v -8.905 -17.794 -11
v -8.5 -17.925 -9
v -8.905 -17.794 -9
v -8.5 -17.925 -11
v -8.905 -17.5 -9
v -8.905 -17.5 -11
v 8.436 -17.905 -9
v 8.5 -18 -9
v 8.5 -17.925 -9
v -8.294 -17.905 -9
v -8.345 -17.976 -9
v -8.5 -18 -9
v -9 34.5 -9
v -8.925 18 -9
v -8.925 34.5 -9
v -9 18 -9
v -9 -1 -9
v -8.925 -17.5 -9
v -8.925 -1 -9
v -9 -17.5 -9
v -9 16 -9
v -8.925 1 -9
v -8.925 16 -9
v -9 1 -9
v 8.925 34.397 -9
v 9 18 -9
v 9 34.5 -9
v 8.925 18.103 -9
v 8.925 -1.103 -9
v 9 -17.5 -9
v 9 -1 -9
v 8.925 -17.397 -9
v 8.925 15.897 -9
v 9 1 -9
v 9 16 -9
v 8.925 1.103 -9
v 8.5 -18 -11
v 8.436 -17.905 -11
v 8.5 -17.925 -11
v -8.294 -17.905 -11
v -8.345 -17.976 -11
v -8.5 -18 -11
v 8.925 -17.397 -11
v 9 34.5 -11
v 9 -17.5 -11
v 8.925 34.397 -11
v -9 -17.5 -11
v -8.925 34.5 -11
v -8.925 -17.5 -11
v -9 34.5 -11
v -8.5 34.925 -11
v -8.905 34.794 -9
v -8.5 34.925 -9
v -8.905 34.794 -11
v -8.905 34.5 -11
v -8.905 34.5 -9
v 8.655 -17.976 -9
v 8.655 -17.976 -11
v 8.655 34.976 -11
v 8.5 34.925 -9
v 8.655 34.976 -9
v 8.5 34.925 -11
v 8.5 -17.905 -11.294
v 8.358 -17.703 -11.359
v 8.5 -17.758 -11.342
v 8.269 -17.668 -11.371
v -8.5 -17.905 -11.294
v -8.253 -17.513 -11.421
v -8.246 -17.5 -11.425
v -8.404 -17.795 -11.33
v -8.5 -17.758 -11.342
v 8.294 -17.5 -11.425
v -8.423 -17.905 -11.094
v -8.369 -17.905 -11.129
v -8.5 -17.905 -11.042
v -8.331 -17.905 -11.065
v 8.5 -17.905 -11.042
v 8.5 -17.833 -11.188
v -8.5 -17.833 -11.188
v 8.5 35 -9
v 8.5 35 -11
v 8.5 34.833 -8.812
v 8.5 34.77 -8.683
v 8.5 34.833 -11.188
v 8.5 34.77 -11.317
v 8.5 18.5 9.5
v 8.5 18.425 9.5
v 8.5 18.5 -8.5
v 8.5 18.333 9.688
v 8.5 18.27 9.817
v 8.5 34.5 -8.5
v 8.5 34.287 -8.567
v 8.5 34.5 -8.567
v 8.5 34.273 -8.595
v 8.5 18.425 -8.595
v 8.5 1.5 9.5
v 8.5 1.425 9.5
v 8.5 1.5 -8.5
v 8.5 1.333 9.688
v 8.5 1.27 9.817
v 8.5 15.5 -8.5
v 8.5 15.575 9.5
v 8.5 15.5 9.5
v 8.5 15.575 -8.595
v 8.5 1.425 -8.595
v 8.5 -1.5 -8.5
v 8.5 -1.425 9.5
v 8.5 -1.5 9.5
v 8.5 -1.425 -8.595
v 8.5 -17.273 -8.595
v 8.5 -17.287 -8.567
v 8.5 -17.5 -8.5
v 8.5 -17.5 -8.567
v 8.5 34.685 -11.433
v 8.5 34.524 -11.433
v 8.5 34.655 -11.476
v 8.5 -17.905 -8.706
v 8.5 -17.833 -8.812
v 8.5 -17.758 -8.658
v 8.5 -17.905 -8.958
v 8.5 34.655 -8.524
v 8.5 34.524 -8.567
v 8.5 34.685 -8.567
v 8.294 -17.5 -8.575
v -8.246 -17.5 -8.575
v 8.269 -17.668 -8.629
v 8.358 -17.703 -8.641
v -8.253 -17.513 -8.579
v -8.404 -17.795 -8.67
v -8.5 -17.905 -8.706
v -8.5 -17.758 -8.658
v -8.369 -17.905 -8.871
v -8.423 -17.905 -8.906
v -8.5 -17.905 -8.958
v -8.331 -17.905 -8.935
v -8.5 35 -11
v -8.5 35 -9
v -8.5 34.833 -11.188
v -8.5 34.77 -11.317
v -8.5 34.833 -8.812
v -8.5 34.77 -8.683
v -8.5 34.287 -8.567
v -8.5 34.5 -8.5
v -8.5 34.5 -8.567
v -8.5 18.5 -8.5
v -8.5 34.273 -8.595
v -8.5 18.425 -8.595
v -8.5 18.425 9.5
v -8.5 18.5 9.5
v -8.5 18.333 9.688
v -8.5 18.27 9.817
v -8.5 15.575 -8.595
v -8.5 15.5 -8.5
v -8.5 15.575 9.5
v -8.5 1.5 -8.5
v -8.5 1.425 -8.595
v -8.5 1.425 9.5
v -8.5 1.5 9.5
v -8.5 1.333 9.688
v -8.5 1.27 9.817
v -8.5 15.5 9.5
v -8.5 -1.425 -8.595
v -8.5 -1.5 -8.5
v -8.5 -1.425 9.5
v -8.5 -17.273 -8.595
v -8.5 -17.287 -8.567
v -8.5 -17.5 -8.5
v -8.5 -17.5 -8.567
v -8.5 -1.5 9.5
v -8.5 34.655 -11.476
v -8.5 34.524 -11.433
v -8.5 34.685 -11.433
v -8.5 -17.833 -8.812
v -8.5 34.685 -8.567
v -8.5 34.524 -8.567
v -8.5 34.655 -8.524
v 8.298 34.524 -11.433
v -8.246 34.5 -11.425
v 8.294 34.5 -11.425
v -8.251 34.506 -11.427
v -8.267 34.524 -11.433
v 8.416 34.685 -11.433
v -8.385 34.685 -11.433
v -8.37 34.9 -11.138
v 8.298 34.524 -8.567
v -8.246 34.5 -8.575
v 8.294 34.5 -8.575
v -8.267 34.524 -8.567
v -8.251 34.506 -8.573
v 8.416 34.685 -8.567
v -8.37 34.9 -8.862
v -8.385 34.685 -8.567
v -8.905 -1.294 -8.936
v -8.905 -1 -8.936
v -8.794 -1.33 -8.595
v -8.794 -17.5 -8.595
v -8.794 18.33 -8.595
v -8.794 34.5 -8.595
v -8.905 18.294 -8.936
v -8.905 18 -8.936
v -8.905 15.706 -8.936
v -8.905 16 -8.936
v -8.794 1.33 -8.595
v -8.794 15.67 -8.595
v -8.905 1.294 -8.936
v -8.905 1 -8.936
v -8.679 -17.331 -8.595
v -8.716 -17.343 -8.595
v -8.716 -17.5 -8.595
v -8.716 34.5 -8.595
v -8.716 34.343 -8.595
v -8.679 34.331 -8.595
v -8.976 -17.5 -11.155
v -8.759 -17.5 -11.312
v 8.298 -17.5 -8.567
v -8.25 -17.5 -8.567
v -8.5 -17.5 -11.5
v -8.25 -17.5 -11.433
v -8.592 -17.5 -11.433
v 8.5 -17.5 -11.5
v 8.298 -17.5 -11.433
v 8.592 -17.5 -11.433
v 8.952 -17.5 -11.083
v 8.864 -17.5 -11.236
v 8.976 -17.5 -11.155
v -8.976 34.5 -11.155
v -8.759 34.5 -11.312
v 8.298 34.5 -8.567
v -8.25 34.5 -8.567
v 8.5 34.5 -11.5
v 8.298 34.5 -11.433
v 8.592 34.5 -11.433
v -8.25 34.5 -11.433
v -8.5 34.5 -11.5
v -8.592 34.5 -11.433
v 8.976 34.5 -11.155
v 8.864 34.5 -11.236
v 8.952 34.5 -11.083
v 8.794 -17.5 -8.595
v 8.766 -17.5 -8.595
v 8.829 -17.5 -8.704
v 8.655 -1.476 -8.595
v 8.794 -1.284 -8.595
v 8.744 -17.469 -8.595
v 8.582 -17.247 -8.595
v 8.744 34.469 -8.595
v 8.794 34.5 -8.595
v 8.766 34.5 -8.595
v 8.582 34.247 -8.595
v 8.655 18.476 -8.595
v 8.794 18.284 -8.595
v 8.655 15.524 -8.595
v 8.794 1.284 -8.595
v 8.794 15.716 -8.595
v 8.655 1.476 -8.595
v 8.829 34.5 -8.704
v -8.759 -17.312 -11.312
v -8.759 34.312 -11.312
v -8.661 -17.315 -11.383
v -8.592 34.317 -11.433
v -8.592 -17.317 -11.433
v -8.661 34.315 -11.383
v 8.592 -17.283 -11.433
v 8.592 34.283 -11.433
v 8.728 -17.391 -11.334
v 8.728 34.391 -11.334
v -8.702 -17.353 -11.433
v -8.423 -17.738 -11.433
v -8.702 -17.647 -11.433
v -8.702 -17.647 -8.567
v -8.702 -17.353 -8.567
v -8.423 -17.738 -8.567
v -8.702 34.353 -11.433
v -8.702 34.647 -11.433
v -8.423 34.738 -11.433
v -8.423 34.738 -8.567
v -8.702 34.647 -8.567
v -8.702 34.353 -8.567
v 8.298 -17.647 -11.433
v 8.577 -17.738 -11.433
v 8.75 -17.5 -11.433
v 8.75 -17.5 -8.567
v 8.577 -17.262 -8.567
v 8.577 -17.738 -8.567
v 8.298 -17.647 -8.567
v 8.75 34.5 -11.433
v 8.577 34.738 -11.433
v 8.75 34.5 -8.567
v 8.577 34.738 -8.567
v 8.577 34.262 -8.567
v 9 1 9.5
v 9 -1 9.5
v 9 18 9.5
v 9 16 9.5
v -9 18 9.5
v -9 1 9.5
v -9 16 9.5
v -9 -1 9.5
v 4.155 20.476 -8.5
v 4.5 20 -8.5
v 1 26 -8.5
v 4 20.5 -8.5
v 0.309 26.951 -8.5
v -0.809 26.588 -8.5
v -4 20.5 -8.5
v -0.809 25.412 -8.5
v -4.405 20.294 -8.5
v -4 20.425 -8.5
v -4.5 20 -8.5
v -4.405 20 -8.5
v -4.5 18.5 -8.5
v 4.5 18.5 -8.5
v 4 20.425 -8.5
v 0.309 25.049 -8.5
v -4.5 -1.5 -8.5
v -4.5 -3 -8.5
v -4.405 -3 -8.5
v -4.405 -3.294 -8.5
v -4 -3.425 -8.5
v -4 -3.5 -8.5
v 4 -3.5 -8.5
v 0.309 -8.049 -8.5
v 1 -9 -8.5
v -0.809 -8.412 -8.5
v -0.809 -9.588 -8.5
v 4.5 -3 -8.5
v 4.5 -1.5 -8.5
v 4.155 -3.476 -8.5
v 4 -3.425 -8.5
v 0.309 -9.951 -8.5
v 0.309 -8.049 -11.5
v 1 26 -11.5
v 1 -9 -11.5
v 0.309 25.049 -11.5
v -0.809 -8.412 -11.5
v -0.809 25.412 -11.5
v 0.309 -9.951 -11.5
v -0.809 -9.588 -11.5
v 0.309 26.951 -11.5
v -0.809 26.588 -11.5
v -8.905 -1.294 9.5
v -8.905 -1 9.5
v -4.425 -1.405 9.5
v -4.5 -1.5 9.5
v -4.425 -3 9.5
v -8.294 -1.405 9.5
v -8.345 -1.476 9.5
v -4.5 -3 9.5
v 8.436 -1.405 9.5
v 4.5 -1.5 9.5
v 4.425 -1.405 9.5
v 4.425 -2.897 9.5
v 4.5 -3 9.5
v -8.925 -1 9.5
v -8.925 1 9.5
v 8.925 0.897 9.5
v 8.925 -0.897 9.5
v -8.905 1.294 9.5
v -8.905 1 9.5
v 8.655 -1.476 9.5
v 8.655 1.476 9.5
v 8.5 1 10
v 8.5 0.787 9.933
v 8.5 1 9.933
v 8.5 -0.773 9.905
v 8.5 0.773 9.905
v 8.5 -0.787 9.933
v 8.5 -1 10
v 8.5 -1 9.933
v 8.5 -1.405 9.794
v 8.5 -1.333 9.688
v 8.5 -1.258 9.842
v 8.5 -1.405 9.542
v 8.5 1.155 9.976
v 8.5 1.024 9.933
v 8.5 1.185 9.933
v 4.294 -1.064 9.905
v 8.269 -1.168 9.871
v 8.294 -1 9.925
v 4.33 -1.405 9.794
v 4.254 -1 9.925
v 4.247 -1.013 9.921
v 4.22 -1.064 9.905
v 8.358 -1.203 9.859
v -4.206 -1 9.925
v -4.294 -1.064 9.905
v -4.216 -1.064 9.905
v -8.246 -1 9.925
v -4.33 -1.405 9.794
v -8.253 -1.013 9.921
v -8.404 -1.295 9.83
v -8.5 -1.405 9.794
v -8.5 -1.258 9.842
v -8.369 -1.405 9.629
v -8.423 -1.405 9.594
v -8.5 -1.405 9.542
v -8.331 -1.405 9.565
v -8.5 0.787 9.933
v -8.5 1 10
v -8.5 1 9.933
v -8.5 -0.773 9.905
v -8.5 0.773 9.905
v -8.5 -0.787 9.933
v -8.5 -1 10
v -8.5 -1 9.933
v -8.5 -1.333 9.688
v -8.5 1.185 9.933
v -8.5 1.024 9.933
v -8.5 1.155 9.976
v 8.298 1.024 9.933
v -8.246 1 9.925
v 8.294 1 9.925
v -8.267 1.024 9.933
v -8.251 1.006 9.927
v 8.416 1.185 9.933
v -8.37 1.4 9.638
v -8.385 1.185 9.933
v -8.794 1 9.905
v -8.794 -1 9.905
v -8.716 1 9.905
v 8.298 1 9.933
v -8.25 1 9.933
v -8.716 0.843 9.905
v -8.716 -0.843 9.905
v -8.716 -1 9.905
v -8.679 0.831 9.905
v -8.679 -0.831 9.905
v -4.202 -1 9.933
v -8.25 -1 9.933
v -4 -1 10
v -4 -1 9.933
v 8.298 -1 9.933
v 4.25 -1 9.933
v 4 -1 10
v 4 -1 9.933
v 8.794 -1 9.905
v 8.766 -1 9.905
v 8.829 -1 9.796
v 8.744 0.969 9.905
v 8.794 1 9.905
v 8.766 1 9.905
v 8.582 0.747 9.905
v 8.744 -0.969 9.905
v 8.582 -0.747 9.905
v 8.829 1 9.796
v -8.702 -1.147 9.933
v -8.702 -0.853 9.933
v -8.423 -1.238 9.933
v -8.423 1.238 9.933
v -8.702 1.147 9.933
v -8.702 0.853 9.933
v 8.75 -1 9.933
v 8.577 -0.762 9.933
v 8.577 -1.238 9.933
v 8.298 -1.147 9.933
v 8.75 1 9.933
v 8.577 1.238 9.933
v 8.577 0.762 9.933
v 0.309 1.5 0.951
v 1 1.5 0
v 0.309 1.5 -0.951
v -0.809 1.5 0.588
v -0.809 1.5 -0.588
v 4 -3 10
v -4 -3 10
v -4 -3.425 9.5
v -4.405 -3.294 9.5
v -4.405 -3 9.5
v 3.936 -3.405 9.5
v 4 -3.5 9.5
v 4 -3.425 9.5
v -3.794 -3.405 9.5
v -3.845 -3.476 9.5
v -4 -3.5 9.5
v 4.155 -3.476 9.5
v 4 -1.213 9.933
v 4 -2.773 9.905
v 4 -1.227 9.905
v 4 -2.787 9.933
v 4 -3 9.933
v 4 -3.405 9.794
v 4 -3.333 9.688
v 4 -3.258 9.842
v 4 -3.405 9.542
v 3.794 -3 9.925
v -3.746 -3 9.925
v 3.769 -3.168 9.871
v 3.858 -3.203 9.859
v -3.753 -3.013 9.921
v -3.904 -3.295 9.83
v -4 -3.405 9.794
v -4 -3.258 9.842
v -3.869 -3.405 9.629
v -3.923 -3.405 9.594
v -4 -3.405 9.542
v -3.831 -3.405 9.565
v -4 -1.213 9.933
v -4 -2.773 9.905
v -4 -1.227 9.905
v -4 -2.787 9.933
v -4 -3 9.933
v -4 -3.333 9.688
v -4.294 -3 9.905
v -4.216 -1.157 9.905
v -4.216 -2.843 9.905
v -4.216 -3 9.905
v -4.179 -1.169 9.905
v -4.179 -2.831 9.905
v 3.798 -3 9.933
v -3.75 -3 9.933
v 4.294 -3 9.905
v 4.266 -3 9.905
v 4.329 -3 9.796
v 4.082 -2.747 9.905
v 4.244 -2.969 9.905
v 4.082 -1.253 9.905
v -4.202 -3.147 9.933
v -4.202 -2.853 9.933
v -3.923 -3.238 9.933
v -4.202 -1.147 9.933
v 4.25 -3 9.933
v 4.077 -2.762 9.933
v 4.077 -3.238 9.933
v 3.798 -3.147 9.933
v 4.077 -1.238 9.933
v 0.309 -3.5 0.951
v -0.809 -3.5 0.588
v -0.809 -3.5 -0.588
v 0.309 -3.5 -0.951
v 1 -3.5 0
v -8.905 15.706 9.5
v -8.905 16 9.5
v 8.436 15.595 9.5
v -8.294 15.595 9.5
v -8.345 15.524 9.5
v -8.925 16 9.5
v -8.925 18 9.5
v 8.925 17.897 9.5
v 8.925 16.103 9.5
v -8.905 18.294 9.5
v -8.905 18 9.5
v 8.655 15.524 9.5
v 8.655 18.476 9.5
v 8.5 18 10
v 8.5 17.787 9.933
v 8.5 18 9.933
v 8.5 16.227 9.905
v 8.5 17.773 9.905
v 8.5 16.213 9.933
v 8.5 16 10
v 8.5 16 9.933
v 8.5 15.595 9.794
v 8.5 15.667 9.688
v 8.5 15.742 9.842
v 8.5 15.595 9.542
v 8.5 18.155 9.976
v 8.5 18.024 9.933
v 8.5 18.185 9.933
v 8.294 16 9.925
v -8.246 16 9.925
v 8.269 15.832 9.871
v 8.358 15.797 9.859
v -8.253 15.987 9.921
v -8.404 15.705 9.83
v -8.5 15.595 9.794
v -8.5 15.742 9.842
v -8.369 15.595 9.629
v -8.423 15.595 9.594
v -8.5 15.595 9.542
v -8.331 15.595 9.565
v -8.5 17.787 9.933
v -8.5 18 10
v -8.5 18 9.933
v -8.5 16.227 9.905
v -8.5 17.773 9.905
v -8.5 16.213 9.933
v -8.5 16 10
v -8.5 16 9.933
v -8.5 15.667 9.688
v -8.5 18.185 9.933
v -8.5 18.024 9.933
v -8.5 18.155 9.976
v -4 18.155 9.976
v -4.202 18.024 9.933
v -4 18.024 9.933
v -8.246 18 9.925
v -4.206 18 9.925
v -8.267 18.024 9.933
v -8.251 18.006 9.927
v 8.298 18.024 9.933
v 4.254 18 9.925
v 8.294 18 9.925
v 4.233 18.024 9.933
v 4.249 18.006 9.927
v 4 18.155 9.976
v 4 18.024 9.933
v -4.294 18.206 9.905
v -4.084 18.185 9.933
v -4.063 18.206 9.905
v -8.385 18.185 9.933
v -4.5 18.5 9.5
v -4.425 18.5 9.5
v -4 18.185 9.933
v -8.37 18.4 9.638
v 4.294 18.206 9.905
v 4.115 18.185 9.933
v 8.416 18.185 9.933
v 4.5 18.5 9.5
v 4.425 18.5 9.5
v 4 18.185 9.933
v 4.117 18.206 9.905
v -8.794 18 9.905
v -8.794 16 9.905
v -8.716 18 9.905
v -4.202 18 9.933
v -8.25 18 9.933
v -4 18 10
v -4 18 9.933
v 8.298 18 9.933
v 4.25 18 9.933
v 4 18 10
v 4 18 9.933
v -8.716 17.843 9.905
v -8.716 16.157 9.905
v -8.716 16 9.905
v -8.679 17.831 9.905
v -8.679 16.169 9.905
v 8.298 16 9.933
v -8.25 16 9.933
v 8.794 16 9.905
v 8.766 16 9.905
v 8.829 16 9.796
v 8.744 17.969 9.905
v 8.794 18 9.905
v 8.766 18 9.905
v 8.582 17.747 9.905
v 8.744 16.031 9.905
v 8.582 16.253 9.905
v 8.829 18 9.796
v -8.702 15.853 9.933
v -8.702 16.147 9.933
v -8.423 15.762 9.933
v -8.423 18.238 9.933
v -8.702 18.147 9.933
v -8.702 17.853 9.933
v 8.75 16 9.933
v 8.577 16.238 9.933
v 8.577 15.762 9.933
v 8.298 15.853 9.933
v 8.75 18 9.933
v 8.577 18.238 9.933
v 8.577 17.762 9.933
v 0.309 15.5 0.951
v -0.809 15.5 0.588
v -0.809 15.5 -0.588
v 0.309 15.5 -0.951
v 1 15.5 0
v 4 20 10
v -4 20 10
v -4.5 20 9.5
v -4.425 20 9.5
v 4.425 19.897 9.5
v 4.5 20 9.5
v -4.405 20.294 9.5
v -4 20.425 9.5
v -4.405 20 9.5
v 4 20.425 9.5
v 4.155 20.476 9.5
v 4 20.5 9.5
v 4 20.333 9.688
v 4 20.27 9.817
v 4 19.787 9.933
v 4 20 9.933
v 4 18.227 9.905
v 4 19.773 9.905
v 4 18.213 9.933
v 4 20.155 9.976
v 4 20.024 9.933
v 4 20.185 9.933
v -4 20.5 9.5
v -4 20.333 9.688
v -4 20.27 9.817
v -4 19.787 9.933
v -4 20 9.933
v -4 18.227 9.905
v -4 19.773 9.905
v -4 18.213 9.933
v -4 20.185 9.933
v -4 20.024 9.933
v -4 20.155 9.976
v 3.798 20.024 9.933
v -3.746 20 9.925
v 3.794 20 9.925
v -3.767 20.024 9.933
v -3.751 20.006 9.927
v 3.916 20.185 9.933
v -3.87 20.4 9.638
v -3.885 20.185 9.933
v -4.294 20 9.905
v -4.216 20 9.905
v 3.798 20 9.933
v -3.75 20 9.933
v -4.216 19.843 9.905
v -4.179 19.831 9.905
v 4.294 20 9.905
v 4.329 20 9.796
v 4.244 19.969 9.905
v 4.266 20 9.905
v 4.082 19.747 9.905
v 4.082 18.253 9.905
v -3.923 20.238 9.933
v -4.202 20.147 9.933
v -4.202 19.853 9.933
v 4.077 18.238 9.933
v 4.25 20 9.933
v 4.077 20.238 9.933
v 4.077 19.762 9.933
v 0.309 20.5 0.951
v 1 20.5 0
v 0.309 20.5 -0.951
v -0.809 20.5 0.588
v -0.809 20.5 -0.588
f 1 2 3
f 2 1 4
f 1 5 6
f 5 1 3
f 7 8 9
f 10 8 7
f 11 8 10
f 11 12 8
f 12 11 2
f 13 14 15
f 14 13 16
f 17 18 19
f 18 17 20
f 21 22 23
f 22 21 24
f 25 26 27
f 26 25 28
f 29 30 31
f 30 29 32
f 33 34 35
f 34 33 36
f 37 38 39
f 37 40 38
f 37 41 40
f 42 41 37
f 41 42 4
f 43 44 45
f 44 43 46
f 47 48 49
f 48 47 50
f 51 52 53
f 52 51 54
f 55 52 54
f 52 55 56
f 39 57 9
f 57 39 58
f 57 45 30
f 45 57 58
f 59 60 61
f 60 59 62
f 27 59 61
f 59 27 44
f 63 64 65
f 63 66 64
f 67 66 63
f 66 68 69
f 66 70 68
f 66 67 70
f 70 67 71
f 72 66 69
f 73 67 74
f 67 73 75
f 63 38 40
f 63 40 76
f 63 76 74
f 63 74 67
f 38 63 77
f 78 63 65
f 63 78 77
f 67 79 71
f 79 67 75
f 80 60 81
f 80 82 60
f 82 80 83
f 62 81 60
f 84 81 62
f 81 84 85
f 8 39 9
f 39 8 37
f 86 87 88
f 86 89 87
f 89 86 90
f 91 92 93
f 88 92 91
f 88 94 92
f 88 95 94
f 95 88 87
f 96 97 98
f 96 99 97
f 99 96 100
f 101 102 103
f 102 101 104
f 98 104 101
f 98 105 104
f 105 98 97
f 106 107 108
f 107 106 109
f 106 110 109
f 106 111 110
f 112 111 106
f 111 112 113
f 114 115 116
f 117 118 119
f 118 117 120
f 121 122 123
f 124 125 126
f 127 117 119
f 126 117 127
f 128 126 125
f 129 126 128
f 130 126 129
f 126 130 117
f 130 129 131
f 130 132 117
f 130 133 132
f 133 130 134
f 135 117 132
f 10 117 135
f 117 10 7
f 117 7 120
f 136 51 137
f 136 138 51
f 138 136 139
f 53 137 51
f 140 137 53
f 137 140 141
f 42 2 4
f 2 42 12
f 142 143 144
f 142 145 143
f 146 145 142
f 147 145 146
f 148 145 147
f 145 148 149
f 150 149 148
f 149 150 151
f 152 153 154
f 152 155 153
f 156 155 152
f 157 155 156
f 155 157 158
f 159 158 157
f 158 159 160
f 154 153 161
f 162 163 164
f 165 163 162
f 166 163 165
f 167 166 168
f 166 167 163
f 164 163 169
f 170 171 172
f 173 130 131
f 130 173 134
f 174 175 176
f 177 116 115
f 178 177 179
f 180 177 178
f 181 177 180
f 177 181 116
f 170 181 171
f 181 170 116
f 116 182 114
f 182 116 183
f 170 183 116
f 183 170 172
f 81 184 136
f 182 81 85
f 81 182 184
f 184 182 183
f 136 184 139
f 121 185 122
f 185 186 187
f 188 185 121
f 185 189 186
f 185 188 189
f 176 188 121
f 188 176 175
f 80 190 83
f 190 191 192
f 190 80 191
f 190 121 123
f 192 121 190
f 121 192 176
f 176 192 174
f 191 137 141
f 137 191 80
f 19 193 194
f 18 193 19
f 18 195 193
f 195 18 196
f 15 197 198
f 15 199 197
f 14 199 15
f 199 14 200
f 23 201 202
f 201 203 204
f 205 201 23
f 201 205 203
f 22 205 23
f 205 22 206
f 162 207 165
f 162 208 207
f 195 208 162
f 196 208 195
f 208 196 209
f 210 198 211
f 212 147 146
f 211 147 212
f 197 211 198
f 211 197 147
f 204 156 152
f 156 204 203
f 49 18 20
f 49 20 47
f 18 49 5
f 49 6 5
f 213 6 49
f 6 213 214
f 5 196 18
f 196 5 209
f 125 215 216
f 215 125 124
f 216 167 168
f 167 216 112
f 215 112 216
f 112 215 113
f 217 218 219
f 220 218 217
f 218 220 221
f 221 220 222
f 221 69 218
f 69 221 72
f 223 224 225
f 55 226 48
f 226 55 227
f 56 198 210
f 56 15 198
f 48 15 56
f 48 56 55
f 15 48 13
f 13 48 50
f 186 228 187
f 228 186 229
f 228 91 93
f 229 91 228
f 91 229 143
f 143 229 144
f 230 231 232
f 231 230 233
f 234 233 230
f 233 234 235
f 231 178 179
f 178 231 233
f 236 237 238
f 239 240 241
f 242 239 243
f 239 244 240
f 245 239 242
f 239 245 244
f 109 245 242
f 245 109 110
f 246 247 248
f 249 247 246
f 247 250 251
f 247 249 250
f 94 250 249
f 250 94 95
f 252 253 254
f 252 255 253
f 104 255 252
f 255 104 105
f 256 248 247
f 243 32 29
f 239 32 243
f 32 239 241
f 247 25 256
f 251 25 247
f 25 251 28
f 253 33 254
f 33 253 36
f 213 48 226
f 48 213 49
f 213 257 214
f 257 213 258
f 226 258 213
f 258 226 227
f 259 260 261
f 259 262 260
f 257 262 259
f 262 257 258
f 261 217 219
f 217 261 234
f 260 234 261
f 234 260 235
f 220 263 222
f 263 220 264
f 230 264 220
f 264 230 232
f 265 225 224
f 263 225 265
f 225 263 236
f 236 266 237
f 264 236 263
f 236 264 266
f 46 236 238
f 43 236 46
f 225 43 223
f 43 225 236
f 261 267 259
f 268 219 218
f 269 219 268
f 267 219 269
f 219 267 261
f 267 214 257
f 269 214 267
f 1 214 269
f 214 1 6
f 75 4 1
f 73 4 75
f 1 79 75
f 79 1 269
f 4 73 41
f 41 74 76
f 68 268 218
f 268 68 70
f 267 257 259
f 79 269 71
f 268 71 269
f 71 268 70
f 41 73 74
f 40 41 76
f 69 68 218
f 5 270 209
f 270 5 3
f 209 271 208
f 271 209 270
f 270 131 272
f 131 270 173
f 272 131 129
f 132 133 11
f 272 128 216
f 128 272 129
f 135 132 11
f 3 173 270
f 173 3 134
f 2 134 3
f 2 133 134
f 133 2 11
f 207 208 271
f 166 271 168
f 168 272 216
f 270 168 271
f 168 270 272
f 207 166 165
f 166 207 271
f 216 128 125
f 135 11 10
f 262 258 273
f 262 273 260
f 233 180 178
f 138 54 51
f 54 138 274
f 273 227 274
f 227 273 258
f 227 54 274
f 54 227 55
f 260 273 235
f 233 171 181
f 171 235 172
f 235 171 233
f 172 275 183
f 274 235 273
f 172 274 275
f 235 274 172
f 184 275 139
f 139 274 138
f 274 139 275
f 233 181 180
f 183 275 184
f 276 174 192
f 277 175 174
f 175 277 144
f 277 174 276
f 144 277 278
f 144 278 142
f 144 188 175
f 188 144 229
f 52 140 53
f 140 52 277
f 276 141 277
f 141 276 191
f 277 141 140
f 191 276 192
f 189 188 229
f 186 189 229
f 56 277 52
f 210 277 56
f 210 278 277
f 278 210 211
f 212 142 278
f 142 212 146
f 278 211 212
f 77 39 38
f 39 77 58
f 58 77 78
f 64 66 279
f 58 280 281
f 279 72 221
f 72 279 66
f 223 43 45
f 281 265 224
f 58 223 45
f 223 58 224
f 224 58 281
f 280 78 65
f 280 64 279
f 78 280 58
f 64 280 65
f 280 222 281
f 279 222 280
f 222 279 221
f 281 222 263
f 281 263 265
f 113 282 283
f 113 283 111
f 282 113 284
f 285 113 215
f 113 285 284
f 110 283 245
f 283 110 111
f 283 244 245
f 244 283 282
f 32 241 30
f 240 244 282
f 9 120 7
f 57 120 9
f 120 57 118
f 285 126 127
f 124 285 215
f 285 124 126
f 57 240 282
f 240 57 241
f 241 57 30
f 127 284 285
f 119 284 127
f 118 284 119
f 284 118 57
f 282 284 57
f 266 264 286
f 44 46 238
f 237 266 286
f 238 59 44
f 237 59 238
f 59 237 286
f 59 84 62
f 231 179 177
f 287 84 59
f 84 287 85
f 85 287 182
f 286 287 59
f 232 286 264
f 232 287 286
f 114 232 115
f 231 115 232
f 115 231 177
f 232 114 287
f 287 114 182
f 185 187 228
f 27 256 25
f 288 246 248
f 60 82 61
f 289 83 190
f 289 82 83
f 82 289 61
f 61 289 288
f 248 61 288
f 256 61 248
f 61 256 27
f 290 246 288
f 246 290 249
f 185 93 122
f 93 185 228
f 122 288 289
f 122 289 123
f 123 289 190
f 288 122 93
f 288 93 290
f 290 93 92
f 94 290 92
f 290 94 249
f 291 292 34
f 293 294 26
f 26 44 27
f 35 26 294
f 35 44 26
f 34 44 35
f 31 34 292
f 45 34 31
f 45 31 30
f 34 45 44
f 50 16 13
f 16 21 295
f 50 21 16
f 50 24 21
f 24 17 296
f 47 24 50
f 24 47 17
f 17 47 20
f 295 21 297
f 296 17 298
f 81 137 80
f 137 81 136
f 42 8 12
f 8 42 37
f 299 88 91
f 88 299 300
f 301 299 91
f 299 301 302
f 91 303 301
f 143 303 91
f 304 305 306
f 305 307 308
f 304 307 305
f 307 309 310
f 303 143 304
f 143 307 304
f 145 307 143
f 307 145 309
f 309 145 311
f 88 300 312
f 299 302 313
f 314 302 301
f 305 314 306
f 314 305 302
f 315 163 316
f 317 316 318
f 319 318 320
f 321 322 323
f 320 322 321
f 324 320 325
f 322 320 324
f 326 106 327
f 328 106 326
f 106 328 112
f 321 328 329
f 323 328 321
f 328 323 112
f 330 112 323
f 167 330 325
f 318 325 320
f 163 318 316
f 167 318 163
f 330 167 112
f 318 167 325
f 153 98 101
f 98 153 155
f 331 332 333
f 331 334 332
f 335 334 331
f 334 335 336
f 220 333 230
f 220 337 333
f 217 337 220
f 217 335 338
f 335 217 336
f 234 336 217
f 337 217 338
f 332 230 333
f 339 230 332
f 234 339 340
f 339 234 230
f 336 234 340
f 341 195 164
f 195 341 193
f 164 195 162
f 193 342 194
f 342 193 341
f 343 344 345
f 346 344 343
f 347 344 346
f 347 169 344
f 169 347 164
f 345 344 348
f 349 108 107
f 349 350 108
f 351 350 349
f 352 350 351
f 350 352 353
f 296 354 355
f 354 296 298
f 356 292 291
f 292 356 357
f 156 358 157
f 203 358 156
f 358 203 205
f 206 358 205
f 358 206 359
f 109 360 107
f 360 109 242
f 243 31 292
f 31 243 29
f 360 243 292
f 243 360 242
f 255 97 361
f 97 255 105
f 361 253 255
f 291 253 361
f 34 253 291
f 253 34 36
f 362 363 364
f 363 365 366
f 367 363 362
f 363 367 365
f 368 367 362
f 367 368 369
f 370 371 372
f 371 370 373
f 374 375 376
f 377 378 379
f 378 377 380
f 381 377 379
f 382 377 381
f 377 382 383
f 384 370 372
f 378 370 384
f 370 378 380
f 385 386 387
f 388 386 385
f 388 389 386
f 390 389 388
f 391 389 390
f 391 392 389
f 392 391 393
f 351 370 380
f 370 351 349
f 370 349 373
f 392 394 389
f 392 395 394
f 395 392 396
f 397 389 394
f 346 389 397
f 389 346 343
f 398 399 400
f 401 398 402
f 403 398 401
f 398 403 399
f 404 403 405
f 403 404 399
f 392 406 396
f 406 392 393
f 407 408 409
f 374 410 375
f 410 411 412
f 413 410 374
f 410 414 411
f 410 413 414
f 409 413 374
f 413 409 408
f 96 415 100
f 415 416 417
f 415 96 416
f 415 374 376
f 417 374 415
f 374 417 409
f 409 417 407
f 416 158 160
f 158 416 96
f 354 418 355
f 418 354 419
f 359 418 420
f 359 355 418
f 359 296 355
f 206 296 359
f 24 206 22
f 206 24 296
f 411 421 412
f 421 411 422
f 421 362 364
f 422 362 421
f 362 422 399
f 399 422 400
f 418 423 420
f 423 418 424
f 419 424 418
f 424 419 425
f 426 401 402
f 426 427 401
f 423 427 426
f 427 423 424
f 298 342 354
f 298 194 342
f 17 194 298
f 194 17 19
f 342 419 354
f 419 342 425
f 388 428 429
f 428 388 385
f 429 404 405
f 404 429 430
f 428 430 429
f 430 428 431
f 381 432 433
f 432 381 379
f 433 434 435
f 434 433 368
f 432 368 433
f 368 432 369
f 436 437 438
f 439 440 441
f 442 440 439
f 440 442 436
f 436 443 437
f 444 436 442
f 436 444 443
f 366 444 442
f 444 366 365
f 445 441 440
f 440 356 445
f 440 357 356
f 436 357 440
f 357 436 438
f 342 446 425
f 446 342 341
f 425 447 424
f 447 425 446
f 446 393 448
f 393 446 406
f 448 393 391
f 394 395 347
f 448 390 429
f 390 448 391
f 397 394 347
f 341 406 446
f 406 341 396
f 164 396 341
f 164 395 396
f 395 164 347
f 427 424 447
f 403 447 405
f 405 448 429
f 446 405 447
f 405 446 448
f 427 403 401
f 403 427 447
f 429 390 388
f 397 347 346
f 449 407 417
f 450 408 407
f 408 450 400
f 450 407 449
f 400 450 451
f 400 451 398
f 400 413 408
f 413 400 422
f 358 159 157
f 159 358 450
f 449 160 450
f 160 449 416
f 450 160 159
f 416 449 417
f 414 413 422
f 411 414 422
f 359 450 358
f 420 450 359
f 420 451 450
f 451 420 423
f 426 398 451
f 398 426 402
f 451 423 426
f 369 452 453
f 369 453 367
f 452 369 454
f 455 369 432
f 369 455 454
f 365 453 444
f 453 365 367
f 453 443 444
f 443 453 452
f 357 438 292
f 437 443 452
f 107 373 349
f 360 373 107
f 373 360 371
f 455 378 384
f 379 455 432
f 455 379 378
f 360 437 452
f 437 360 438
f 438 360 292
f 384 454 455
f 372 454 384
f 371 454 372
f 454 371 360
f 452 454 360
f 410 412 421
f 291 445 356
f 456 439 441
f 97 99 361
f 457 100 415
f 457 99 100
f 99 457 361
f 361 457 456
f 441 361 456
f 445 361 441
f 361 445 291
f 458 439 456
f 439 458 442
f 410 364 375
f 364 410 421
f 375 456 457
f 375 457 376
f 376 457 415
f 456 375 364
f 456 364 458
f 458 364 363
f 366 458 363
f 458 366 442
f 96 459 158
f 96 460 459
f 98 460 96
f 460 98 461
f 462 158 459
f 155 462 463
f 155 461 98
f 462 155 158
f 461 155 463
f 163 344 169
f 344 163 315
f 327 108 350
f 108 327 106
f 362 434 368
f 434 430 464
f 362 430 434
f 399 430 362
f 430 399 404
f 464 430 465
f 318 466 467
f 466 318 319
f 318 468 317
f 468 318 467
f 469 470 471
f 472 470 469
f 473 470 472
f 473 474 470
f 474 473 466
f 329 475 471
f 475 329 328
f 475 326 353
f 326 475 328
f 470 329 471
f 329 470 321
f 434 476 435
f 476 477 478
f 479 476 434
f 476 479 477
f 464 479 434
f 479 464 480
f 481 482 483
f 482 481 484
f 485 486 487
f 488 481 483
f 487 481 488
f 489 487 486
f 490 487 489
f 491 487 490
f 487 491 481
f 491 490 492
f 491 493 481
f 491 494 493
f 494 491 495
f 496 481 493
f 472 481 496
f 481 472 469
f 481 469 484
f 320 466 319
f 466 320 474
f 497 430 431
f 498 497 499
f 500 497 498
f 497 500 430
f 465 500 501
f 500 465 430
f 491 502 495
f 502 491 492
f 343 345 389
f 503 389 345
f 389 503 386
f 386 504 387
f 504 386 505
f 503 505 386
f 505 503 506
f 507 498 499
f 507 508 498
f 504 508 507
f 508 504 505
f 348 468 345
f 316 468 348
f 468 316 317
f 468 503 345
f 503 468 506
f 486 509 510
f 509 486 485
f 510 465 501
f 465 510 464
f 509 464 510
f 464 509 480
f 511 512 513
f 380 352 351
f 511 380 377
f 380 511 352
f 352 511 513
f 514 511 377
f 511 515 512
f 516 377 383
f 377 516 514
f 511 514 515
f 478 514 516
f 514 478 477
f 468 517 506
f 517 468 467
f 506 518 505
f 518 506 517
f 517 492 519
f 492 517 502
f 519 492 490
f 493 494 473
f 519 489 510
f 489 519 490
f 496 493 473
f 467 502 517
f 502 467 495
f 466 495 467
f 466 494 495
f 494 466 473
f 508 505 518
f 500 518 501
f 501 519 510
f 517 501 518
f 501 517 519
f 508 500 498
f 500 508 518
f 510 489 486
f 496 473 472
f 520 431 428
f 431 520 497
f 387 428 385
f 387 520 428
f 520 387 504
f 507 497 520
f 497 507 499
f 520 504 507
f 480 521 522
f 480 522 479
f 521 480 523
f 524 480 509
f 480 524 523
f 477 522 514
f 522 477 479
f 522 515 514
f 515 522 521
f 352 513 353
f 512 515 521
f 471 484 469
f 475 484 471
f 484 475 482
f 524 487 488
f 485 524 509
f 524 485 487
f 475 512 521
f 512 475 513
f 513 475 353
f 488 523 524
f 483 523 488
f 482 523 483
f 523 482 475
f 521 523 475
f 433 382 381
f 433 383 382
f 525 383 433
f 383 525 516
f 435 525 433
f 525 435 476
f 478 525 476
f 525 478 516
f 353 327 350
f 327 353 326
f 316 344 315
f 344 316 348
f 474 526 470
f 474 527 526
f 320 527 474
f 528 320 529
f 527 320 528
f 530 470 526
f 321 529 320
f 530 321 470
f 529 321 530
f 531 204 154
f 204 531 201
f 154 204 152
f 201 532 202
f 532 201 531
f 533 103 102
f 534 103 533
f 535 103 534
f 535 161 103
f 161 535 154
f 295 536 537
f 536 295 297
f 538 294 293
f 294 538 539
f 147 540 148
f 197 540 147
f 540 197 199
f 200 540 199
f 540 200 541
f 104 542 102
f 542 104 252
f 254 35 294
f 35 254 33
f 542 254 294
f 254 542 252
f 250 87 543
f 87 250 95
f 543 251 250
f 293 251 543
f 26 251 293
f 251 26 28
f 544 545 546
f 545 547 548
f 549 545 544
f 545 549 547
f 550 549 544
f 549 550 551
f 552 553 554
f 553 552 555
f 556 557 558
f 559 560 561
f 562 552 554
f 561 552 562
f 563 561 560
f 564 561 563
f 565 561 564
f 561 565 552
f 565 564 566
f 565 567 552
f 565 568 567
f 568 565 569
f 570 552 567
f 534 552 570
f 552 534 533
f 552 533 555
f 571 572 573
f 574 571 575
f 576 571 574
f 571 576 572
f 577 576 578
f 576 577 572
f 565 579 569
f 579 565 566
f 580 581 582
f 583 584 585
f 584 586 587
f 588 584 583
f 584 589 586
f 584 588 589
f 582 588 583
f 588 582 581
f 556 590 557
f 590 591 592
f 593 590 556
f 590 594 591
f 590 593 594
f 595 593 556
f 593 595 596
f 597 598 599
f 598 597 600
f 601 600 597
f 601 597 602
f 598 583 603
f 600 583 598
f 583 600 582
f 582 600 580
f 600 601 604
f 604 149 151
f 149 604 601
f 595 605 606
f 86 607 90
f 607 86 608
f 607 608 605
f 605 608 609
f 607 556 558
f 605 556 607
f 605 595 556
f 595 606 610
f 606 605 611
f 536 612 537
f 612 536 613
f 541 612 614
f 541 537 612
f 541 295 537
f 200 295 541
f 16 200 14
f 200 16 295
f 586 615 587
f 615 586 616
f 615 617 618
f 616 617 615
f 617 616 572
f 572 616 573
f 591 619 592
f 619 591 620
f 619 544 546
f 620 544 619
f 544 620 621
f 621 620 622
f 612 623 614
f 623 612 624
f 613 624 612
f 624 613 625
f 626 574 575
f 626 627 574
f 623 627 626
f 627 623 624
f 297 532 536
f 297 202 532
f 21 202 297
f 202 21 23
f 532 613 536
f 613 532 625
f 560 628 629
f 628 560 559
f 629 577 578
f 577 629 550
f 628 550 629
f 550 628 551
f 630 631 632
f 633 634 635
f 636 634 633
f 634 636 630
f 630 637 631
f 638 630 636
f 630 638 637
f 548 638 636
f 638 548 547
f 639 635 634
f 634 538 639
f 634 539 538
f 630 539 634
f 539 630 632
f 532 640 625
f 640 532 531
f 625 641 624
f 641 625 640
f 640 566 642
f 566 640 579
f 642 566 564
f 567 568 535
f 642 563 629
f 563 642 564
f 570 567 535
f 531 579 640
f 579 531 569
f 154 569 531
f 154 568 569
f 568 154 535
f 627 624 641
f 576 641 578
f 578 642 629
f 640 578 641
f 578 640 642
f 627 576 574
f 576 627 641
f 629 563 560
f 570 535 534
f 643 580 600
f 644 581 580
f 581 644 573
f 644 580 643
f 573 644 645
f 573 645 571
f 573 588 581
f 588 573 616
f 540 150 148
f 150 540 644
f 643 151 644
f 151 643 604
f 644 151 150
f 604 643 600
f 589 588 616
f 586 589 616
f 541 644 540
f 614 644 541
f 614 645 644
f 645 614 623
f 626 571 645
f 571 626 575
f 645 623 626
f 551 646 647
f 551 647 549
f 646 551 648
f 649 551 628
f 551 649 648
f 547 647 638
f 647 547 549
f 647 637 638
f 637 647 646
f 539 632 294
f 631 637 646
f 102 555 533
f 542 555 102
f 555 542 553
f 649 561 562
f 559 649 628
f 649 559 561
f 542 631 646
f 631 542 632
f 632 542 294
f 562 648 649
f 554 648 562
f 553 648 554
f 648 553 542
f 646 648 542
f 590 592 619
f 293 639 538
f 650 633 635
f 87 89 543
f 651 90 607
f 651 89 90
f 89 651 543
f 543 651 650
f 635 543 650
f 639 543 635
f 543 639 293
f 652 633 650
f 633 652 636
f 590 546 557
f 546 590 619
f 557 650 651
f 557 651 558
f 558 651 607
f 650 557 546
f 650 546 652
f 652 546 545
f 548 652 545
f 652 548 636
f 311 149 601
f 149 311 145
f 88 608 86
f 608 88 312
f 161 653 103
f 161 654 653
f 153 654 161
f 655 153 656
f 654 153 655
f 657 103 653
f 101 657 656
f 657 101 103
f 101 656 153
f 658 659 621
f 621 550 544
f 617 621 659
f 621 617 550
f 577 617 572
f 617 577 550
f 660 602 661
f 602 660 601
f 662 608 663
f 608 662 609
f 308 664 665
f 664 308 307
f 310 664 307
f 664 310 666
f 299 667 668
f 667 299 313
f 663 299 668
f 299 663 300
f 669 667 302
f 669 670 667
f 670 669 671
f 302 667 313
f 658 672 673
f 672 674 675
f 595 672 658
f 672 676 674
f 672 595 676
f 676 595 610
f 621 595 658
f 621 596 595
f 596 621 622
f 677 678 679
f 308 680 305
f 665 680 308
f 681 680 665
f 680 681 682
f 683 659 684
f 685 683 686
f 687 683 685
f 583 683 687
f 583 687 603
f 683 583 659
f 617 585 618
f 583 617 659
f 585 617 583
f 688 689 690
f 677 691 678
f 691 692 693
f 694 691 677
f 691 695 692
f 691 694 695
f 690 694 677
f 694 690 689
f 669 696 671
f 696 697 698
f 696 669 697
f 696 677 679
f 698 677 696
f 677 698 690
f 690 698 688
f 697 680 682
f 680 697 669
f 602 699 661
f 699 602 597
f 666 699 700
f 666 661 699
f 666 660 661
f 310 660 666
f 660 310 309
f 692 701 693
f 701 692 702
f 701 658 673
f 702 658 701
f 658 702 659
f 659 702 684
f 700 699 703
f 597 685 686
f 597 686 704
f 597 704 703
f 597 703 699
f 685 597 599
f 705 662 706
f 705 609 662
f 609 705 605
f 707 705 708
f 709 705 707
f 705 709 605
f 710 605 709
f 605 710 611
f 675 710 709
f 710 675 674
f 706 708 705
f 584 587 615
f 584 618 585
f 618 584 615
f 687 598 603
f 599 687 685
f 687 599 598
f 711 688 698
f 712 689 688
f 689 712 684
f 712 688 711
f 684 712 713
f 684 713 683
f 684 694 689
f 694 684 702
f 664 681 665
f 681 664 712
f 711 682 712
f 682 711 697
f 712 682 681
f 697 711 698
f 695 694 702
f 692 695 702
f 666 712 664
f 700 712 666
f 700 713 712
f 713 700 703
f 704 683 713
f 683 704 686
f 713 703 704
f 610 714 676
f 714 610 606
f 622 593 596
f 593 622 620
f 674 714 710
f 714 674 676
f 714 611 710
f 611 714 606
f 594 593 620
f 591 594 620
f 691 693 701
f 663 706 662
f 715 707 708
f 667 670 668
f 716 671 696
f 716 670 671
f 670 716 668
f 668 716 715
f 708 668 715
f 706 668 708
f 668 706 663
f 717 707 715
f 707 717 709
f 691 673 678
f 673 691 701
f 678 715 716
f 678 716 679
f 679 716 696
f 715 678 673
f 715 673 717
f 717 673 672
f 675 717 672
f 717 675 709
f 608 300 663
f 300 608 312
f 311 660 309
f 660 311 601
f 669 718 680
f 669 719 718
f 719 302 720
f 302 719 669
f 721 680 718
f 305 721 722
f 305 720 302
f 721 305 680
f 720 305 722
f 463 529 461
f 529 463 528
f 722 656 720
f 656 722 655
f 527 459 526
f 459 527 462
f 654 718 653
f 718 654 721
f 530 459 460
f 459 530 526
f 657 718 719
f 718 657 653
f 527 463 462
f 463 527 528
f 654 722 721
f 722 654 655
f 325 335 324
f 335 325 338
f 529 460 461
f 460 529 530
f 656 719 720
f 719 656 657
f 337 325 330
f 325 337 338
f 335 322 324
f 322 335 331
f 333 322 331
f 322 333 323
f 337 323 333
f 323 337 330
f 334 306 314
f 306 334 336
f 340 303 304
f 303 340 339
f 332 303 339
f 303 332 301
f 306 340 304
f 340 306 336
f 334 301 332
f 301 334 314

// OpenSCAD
use <MCAD/boxes.scad>

$thickness = 3;
$woodW = 18;
$woodH = 12;

module base() {
translate([0,($woodH+5)/2,-10]) { roundedBox([$woodW,30+(2*$thickness)+$woodH+5,$thickness], 0.5); }
translate([0,0,0]) { roundedBox([$woodW,$thickness,20],0.5); }
translate([0,-2,0]) { roundedBox([$woodW/2,$thickness,20],0.5); }
translate([0,$woodH+5,0]) { roundedBox([$woodW,$thickness,20], 0.5); }
translate([0,$woodH+7,0]) { roundedBox([$woodW/2,$thickness,20], 0.5); }
}


module holes() {
rotate([90,0,0]) {cylinder(50,1,1,true);}
translate([0,-9,0]) { cylinder(40,1,1,true);}
translate([0,26,0]) { cylinder(40,1,1,true);}

}


difference() {
base();
    holes();
}
